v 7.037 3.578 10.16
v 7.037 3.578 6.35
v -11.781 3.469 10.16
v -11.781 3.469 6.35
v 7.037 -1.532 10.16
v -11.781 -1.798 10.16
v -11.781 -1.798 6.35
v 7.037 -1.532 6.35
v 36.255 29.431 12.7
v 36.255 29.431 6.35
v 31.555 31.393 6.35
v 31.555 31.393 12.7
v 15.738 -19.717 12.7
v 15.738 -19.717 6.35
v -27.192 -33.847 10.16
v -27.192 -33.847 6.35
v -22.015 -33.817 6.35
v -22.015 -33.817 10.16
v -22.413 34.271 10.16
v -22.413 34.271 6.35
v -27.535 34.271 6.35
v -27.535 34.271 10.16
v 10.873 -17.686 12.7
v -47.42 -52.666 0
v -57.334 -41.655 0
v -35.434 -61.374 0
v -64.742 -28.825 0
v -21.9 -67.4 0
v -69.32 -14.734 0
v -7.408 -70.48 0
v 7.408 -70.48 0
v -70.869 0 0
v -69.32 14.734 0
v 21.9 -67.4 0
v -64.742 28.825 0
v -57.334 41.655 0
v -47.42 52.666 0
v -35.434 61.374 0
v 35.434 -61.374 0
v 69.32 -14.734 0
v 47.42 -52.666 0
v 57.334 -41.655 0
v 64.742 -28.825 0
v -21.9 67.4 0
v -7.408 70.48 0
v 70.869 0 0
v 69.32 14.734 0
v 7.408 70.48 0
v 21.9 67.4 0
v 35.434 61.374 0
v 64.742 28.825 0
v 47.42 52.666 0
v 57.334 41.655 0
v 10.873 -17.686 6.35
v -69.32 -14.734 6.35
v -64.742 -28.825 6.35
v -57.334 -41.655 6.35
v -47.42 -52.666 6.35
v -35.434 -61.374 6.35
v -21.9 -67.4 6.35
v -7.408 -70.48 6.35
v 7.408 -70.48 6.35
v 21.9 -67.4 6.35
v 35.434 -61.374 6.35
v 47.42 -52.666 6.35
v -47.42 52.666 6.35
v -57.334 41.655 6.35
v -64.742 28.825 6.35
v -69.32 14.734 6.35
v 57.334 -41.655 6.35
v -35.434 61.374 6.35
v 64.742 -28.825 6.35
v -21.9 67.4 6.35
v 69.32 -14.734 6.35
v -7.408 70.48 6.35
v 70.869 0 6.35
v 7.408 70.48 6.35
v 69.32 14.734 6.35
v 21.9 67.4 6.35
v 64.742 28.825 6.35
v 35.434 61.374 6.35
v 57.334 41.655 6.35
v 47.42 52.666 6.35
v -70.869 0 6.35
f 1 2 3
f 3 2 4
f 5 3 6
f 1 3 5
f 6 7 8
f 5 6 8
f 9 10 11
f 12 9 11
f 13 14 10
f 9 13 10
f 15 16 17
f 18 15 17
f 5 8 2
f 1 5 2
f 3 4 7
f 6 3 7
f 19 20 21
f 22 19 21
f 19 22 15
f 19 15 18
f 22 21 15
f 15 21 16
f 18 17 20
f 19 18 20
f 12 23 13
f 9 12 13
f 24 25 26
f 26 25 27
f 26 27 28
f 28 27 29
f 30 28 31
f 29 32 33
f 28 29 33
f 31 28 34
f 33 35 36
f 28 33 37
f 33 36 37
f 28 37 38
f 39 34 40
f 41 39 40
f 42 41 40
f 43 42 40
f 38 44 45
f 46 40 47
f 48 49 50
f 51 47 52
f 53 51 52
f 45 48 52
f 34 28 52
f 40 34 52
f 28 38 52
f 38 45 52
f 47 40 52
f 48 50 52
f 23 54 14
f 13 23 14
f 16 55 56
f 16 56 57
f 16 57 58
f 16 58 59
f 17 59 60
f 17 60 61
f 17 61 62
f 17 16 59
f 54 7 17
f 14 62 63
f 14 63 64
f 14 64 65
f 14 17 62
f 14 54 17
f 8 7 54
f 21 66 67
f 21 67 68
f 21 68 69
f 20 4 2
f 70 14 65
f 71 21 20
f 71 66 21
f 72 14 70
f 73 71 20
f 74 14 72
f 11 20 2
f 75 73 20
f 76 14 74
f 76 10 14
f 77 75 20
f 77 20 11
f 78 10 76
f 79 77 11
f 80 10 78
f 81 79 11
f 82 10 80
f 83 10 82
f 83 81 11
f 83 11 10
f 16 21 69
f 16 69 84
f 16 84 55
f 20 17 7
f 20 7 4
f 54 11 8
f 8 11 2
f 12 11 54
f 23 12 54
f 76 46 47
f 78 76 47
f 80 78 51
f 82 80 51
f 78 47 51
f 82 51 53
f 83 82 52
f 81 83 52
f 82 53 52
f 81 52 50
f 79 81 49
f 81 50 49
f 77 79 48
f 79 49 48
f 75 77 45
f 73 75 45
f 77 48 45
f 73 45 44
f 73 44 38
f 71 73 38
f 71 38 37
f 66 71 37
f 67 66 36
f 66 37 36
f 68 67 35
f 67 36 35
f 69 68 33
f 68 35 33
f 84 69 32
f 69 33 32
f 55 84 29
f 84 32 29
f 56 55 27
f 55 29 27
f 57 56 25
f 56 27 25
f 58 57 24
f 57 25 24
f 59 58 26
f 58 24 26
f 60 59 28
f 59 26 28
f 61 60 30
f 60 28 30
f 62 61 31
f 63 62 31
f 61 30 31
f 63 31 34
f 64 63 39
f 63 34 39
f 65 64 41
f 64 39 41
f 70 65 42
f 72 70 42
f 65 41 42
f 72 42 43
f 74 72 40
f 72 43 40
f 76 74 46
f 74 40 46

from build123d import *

# Parameters (mm, degrees)
F0_R     = 70.868501
F1_DEPTH = 6.35
F2_DEPTH = 10.16
F3_DEPTH = 12.7


with BuildPart() as f1:
    # F0 (on Top) → F1 (new body)
    with BuildSketch(Plane.XY):
        Circle(F0_R)
        Polygon((-27.191779, -33.847008), (-27.535122, 34.270629), (-22.413259, 34.270629), (-22.014963, -33.816725), align=None, mode=Mode.SUBTRACT)
        Polygon((-11.780724, 3.469003), (7.036994, 3.577667), (7.036994, -1.531884), (-11.780724, -1.798139), align=None, mode=Mode.SUBTRACT)
        Polygon((10.873231, -17.685675), (31.554632, 31.392667), (36.254622, 29.430676), (15.738306, -19.71658), align=None, mode=Mode.SUBTRACT)
    extrude(amount=F1_DEPTH)

    # F0 (on Top) → F2 (join)
    with BuildSketch(Plane.XY):
        Polygon((-22.413259, 34.270629), (-27.535122, 34.270629), (-27.191779, -33.847008), (-22.014963, -33.816725), align=None)
        Polygon((7.036994, -1.531884), (7.036994, 3.577667), (-11.780724, 3.469003), (-11.780724, -1.798139), align=None)
    extrude(amount=F2_DEPTH)

    # F0 (on Top) → F3 (join)
    with BuildSketch(Plane.XY):
        Polygon((36.254622, 29.430676), (31.554632, 31.392667), (10.873231, -17.685675), (15.738306, -19.71658), align=None)
    extrude(amount=F3_DEPTH)


solid = f1.part
